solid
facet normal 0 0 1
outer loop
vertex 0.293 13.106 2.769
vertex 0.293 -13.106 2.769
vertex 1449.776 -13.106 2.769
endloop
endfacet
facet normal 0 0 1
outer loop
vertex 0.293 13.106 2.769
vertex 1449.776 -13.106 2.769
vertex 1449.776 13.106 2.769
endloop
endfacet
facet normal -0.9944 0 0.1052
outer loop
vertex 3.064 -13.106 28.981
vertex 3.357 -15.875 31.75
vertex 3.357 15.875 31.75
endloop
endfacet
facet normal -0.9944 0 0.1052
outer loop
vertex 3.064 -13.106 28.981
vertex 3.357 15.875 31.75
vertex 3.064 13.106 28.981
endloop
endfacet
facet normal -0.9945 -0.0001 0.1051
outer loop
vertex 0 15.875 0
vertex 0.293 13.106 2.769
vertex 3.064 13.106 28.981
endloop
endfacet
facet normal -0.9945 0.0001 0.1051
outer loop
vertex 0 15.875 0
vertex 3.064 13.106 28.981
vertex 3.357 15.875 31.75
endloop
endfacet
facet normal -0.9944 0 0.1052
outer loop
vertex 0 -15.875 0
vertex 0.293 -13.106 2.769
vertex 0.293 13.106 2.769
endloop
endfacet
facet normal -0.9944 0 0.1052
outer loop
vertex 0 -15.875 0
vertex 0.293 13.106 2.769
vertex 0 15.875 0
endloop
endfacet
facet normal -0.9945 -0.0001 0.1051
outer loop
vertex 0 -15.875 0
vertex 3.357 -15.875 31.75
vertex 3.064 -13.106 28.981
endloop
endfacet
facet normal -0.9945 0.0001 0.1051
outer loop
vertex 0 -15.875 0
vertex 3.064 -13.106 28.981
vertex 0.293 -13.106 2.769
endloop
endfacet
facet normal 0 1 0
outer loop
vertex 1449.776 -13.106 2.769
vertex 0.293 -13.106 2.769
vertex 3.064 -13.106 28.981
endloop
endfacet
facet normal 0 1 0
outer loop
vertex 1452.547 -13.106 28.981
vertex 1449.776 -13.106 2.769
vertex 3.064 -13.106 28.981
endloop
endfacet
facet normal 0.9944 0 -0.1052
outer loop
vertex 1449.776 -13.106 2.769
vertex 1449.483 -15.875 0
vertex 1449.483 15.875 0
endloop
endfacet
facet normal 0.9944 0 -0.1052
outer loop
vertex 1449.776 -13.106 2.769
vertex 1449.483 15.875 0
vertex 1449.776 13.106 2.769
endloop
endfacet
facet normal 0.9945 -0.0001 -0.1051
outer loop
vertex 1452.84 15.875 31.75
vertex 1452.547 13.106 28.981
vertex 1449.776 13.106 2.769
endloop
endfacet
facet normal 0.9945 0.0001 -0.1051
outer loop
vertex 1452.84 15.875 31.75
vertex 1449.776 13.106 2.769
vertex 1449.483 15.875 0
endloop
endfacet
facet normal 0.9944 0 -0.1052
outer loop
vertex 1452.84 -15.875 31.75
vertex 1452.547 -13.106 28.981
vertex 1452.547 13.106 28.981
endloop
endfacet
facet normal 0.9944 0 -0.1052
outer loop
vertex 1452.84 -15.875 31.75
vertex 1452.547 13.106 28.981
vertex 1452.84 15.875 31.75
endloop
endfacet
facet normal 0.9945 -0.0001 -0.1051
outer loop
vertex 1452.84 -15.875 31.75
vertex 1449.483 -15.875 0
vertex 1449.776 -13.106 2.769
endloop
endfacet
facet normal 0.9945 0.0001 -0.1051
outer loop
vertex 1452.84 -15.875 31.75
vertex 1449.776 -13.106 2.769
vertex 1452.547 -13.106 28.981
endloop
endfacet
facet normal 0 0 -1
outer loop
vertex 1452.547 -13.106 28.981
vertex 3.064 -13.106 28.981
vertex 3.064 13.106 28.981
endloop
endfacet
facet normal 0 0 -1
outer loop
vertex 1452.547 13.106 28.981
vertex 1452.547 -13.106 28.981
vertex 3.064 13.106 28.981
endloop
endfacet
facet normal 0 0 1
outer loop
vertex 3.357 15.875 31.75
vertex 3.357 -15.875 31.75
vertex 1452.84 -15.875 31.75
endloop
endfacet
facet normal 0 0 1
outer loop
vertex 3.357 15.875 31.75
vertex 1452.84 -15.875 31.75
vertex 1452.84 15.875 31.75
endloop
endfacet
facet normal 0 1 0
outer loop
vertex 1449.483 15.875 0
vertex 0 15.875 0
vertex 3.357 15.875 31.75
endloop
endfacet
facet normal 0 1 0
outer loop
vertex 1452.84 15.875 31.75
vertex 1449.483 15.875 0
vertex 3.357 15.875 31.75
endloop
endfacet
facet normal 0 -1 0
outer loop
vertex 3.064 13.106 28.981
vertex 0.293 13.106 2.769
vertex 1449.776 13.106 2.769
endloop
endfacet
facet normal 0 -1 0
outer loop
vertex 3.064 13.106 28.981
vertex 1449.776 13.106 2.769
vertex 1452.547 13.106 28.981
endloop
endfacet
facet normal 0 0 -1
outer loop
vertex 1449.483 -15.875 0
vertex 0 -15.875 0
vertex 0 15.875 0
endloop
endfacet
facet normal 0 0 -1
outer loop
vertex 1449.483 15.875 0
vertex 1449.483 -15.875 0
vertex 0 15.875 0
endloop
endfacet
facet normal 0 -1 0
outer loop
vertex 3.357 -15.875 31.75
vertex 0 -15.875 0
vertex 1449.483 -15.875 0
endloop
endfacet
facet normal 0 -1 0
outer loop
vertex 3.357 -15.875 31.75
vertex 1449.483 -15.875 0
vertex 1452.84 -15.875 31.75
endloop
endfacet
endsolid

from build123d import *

# Parameters (mm, degrees)
SKETCH_W        = 31.75
SKETCH_H        = 31.75
SKETCH_W_2      = 26.2128
SKETCH_H_2      = 26.2128
PAD_DEPTH       = 1452.84
POCKET_DEPTH    = 31.75
POCKET001_DEPTH = 31.75


with BuildPart() as part:
    # Sketch → Pad (new body)
    with BuildSketch(Plane.YZ):
        with Locations((0, 15.875)):
            Rectangle(SKETCH_W, SKETCH_H)
        with Locations((0, 15.875)):
            Rectangle(SKETCH_W_2, SKETCH_H_2, mode=Mode.SUBTRACT)
    extrude(amount=PAD_DEPTH)

    # Sketch001 → Pocket (cut)
    with BuildSketch(Plane(origin=(0, -15.875, 0), x_dir=(0, 0, -1), z_dir=(0, -1, 0))):
        Polygon((0, 0), (-31.75, 0), (-31.75, 3.356827), align=None)
    extrude(amount=-POCKET_DEPTH, mode=Mode.SUBTRACT)

    # Sketch002 → Pocket001 (cut)
    with BuildSketch(Plane(origin=(0, -15.875, 0), x_dir=(0, 0, -1), z_dir=(0, -1, 0))):
        Polygon((-31.75, 1452.84), (0, 1452.84), (0, 1449.483173), align=None)
    extrude(amount=-POCKET001_DEPTH, mode=Mode.SUBTRACT)


solid = part.part
